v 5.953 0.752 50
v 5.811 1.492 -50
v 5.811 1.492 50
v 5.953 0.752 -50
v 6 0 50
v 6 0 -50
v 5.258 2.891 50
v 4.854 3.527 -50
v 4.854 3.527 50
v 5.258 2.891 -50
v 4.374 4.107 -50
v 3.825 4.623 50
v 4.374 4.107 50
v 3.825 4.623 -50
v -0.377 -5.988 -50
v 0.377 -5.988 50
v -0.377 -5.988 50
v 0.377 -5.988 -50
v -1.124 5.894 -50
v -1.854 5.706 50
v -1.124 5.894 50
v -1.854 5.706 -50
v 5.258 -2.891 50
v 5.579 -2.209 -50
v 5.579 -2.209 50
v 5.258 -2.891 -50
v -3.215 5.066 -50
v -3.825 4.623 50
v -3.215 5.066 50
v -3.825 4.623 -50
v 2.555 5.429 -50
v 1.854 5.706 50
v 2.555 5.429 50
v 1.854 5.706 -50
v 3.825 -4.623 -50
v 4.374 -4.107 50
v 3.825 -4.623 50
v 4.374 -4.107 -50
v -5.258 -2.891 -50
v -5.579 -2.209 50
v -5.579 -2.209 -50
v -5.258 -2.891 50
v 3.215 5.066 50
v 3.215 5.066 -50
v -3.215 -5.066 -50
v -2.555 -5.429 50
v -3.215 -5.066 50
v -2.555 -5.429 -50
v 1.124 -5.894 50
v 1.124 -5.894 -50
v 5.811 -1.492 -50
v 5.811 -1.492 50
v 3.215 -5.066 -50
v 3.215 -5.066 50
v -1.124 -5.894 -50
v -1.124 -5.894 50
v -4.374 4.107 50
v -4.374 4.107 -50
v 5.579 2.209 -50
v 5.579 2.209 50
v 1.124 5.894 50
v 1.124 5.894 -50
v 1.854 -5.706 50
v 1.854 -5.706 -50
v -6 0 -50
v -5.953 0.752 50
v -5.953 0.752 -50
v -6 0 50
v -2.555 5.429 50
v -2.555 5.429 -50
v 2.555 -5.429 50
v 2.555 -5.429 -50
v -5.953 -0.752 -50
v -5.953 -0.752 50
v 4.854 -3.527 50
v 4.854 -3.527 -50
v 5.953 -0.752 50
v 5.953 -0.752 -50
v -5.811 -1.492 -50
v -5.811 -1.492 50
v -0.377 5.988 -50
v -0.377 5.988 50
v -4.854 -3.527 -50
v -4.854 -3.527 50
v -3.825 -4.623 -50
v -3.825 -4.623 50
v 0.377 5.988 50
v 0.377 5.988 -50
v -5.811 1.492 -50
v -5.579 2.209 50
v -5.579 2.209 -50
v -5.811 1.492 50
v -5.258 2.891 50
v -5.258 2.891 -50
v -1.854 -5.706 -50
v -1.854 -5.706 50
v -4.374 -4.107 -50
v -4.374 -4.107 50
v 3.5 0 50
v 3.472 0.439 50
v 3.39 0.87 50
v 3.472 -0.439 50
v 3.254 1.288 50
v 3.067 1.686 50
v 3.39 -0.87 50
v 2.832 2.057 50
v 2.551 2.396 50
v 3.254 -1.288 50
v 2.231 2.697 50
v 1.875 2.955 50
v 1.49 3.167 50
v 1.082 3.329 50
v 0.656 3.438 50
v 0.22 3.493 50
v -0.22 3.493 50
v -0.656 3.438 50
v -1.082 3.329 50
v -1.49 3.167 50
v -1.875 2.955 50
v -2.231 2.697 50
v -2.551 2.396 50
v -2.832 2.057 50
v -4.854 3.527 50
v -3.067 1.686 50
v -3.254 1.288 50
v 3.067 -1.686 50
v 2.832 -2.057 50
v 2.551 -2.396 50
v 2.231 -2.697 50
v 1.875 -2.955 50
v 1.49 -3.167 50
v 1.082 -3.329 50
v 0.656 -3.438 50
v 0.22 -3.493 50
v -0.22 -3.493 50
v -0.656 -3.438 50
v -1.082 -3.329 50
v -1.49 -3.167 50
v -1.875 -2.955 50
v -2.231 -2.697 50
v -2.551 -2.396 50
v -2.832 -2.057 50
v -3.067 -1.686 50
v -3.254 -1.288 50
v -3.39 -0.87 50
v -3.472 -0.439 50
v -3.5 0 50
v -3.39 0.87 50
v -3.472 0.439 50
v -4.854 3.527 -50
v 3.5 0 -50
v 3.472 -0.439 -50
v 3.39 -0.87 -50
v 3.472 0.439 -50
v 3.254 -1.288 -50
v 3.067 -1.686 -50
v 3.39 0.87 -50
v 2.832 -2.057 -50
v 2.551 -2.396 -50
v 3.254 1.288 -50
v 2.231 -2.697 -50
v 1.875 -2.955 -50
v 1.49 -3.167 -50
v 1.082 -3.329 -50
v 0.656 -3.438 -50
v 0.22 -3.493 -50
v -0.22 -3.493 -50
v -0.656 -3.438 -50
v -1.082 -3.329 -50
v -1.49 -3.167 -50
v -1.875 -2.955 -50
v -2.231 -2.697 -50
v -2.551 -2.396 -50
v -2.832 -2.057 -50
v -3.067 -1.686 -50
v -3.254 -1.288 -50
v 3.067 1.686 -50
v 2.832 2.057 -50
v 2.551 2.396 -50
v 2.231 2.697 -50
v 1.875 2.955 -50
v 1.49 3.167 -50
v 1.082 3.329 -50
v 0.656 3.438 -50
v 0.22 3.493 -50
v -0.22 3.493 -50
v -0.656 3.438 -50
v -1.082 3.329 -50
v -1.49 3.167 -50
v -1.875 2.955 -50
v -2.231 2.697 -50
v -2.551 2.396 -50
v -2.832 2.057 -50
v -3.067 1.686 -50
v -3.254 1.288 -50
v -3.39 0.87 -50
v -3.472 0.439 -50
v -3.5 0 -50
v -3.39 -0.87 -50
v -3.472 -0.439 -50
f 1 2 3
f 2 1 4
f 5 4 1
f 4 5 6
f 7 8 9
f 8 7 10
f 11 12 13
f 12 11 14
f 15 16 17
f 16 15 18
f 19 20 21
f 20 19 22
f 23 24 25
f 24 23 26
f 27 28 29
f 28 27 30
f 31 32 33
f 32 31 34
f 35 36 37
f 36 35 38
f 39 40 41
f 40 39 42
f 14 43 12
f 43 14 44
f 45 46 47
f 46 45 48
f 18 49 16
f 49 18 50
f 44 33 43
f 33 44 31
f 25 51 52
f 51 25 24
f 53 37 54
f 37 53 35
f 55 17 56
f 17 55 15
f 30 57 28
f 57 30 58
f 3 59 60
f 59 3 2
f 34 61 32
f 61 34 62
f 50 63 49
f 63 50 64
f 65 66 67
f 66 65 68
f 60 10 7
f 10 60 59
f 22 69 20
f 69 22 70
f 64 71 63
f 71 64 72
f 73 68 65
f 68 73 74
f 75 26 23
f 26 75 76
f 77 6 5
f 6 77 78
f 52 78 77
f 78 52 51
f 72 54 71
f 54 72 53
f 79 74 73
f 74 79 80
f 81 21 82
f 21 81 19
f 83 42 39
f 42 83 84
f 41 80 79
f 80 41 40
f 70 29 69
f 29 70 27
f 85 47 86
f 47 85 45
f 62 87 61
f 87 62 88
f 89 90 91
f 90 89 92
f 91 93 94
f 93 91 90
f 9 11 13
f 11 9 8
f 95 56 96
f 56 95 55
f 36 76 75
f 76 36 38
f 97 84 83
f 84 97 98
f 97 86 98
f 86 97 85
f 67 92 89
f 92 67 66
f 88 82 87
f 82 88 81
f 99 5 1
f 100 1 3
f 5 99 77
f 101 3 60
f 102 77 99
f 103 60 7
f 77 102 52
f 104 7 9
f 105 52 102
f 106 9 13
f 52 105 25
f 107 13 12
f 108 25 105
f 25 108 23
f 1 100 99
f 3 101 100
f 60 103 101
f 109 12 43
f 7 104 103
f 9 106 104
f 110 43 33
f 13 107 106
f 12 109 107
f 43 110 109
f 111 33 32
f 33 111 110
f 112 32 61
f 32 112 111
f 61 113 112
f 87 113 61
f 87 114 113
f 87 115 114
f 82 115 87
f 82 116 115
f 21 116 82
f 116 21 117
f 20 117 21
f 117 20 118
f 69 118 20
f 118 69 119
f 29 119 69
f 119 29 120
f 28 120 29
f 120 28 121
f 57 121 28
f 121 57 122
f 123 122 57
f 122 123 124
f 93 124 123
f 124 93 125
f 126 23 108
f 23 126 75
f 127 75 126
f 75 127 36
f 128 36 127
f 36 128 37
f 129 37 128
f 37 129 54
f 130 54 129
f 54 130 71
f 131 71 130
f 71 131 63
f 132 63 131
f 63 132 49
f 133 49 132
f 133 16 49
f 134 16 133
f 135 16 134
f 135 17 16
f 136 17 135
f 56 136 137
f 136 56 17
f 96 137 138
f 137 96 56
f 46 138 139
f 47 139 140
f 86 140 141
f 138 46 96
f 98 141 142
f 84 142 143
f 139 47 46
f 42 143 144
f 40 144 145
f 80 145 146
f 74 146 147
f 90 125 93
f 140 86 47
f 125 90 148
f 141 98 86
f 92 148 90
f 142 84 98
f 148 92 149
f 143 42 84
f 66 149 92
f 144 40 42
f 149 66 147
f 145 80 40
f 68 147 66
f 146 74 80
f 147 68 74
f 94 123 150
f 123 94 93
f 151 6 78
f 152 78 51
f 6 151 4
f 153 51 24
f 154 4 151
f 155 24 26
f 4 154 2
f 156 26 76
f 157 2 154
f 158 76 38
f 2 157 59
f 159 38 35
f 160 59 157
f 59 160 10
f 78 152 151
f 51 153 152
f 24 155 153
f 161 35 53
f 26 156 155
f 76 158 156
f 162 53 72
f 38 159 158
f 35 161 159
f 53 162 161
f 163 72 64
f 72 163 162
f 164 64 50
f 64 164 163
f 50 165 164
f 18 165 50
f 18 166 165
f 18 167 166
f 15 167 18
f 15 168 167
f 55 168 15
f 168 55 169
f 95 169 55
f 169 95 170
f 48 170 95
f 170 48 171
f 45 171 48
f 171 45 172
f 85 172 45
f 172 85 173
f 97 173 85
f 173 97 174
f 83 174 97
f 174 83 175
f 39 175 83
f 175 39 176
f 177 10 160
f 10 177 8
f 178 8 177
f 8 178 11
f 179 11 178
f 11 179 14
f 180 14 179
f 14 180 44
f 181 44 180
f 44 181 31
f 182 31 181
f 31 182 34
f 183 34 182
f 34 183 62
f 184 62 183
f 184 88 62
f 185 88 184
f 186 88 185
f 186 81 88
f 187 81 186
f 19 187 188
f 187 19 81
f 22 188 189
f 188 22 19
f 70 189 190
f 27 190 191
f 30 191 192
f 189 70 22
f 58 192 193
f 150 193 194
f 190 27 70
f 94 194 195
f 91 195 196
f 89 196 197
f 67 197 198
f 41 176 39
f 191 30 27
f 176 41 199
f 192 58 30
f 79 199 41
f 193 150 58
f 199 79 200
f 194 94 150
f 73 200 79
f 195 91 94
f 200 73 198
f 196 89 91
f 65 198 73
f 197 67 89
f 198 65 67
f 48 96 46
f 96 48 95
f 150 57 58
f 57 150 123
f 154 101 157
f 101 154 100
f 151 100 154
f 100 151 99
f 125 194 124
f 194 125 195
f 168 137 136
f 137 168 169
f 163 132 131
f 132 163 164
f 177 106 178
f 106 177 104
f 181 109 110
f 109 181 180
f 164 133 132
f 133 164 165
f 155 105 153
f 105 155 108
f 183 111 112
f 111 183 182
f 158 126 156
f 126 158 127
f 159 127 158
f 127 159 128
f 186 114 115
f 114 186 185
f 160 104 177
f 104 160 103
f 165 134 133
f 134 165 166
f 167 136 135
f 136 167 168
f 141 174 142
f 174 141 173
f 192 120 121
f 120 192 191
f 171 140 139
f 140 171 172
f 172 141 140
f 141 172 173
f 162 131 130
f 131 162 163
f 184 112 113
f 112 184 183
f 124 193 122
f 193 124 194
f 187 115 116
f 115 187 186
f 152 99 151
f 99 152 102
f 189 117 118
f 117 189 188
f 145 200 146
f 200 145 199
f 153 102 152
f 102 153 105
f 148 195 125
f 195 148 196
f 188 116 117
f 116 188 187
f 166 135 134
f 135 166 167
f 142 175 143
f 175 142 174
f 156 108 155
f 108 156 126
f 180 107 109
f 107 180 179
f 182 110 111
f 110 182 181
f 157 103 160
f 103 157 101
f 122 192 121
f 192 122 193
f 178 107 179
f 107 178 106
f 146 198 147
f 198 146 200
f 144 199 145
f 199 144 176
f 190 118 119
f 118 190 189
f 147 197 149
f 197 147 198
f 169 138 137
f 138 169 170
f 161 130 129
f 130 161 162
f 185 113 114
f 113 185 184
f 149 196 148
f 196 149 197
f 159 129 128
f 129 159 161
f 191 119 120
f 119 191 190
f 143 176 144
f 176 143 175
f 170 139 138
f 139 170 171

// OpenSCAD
$fn = 50;


difference() {
	union() {
		translate(v = [0, 0, -50.0000000000]) {
			cylinder(h = 100, r = 6.0000000000);
		}
	}
	union() {
		translate(v = [0, 0, -100.0000000000]) {
			cylinder(h = 200, r = 3.5000000000);
		}
	}
}
